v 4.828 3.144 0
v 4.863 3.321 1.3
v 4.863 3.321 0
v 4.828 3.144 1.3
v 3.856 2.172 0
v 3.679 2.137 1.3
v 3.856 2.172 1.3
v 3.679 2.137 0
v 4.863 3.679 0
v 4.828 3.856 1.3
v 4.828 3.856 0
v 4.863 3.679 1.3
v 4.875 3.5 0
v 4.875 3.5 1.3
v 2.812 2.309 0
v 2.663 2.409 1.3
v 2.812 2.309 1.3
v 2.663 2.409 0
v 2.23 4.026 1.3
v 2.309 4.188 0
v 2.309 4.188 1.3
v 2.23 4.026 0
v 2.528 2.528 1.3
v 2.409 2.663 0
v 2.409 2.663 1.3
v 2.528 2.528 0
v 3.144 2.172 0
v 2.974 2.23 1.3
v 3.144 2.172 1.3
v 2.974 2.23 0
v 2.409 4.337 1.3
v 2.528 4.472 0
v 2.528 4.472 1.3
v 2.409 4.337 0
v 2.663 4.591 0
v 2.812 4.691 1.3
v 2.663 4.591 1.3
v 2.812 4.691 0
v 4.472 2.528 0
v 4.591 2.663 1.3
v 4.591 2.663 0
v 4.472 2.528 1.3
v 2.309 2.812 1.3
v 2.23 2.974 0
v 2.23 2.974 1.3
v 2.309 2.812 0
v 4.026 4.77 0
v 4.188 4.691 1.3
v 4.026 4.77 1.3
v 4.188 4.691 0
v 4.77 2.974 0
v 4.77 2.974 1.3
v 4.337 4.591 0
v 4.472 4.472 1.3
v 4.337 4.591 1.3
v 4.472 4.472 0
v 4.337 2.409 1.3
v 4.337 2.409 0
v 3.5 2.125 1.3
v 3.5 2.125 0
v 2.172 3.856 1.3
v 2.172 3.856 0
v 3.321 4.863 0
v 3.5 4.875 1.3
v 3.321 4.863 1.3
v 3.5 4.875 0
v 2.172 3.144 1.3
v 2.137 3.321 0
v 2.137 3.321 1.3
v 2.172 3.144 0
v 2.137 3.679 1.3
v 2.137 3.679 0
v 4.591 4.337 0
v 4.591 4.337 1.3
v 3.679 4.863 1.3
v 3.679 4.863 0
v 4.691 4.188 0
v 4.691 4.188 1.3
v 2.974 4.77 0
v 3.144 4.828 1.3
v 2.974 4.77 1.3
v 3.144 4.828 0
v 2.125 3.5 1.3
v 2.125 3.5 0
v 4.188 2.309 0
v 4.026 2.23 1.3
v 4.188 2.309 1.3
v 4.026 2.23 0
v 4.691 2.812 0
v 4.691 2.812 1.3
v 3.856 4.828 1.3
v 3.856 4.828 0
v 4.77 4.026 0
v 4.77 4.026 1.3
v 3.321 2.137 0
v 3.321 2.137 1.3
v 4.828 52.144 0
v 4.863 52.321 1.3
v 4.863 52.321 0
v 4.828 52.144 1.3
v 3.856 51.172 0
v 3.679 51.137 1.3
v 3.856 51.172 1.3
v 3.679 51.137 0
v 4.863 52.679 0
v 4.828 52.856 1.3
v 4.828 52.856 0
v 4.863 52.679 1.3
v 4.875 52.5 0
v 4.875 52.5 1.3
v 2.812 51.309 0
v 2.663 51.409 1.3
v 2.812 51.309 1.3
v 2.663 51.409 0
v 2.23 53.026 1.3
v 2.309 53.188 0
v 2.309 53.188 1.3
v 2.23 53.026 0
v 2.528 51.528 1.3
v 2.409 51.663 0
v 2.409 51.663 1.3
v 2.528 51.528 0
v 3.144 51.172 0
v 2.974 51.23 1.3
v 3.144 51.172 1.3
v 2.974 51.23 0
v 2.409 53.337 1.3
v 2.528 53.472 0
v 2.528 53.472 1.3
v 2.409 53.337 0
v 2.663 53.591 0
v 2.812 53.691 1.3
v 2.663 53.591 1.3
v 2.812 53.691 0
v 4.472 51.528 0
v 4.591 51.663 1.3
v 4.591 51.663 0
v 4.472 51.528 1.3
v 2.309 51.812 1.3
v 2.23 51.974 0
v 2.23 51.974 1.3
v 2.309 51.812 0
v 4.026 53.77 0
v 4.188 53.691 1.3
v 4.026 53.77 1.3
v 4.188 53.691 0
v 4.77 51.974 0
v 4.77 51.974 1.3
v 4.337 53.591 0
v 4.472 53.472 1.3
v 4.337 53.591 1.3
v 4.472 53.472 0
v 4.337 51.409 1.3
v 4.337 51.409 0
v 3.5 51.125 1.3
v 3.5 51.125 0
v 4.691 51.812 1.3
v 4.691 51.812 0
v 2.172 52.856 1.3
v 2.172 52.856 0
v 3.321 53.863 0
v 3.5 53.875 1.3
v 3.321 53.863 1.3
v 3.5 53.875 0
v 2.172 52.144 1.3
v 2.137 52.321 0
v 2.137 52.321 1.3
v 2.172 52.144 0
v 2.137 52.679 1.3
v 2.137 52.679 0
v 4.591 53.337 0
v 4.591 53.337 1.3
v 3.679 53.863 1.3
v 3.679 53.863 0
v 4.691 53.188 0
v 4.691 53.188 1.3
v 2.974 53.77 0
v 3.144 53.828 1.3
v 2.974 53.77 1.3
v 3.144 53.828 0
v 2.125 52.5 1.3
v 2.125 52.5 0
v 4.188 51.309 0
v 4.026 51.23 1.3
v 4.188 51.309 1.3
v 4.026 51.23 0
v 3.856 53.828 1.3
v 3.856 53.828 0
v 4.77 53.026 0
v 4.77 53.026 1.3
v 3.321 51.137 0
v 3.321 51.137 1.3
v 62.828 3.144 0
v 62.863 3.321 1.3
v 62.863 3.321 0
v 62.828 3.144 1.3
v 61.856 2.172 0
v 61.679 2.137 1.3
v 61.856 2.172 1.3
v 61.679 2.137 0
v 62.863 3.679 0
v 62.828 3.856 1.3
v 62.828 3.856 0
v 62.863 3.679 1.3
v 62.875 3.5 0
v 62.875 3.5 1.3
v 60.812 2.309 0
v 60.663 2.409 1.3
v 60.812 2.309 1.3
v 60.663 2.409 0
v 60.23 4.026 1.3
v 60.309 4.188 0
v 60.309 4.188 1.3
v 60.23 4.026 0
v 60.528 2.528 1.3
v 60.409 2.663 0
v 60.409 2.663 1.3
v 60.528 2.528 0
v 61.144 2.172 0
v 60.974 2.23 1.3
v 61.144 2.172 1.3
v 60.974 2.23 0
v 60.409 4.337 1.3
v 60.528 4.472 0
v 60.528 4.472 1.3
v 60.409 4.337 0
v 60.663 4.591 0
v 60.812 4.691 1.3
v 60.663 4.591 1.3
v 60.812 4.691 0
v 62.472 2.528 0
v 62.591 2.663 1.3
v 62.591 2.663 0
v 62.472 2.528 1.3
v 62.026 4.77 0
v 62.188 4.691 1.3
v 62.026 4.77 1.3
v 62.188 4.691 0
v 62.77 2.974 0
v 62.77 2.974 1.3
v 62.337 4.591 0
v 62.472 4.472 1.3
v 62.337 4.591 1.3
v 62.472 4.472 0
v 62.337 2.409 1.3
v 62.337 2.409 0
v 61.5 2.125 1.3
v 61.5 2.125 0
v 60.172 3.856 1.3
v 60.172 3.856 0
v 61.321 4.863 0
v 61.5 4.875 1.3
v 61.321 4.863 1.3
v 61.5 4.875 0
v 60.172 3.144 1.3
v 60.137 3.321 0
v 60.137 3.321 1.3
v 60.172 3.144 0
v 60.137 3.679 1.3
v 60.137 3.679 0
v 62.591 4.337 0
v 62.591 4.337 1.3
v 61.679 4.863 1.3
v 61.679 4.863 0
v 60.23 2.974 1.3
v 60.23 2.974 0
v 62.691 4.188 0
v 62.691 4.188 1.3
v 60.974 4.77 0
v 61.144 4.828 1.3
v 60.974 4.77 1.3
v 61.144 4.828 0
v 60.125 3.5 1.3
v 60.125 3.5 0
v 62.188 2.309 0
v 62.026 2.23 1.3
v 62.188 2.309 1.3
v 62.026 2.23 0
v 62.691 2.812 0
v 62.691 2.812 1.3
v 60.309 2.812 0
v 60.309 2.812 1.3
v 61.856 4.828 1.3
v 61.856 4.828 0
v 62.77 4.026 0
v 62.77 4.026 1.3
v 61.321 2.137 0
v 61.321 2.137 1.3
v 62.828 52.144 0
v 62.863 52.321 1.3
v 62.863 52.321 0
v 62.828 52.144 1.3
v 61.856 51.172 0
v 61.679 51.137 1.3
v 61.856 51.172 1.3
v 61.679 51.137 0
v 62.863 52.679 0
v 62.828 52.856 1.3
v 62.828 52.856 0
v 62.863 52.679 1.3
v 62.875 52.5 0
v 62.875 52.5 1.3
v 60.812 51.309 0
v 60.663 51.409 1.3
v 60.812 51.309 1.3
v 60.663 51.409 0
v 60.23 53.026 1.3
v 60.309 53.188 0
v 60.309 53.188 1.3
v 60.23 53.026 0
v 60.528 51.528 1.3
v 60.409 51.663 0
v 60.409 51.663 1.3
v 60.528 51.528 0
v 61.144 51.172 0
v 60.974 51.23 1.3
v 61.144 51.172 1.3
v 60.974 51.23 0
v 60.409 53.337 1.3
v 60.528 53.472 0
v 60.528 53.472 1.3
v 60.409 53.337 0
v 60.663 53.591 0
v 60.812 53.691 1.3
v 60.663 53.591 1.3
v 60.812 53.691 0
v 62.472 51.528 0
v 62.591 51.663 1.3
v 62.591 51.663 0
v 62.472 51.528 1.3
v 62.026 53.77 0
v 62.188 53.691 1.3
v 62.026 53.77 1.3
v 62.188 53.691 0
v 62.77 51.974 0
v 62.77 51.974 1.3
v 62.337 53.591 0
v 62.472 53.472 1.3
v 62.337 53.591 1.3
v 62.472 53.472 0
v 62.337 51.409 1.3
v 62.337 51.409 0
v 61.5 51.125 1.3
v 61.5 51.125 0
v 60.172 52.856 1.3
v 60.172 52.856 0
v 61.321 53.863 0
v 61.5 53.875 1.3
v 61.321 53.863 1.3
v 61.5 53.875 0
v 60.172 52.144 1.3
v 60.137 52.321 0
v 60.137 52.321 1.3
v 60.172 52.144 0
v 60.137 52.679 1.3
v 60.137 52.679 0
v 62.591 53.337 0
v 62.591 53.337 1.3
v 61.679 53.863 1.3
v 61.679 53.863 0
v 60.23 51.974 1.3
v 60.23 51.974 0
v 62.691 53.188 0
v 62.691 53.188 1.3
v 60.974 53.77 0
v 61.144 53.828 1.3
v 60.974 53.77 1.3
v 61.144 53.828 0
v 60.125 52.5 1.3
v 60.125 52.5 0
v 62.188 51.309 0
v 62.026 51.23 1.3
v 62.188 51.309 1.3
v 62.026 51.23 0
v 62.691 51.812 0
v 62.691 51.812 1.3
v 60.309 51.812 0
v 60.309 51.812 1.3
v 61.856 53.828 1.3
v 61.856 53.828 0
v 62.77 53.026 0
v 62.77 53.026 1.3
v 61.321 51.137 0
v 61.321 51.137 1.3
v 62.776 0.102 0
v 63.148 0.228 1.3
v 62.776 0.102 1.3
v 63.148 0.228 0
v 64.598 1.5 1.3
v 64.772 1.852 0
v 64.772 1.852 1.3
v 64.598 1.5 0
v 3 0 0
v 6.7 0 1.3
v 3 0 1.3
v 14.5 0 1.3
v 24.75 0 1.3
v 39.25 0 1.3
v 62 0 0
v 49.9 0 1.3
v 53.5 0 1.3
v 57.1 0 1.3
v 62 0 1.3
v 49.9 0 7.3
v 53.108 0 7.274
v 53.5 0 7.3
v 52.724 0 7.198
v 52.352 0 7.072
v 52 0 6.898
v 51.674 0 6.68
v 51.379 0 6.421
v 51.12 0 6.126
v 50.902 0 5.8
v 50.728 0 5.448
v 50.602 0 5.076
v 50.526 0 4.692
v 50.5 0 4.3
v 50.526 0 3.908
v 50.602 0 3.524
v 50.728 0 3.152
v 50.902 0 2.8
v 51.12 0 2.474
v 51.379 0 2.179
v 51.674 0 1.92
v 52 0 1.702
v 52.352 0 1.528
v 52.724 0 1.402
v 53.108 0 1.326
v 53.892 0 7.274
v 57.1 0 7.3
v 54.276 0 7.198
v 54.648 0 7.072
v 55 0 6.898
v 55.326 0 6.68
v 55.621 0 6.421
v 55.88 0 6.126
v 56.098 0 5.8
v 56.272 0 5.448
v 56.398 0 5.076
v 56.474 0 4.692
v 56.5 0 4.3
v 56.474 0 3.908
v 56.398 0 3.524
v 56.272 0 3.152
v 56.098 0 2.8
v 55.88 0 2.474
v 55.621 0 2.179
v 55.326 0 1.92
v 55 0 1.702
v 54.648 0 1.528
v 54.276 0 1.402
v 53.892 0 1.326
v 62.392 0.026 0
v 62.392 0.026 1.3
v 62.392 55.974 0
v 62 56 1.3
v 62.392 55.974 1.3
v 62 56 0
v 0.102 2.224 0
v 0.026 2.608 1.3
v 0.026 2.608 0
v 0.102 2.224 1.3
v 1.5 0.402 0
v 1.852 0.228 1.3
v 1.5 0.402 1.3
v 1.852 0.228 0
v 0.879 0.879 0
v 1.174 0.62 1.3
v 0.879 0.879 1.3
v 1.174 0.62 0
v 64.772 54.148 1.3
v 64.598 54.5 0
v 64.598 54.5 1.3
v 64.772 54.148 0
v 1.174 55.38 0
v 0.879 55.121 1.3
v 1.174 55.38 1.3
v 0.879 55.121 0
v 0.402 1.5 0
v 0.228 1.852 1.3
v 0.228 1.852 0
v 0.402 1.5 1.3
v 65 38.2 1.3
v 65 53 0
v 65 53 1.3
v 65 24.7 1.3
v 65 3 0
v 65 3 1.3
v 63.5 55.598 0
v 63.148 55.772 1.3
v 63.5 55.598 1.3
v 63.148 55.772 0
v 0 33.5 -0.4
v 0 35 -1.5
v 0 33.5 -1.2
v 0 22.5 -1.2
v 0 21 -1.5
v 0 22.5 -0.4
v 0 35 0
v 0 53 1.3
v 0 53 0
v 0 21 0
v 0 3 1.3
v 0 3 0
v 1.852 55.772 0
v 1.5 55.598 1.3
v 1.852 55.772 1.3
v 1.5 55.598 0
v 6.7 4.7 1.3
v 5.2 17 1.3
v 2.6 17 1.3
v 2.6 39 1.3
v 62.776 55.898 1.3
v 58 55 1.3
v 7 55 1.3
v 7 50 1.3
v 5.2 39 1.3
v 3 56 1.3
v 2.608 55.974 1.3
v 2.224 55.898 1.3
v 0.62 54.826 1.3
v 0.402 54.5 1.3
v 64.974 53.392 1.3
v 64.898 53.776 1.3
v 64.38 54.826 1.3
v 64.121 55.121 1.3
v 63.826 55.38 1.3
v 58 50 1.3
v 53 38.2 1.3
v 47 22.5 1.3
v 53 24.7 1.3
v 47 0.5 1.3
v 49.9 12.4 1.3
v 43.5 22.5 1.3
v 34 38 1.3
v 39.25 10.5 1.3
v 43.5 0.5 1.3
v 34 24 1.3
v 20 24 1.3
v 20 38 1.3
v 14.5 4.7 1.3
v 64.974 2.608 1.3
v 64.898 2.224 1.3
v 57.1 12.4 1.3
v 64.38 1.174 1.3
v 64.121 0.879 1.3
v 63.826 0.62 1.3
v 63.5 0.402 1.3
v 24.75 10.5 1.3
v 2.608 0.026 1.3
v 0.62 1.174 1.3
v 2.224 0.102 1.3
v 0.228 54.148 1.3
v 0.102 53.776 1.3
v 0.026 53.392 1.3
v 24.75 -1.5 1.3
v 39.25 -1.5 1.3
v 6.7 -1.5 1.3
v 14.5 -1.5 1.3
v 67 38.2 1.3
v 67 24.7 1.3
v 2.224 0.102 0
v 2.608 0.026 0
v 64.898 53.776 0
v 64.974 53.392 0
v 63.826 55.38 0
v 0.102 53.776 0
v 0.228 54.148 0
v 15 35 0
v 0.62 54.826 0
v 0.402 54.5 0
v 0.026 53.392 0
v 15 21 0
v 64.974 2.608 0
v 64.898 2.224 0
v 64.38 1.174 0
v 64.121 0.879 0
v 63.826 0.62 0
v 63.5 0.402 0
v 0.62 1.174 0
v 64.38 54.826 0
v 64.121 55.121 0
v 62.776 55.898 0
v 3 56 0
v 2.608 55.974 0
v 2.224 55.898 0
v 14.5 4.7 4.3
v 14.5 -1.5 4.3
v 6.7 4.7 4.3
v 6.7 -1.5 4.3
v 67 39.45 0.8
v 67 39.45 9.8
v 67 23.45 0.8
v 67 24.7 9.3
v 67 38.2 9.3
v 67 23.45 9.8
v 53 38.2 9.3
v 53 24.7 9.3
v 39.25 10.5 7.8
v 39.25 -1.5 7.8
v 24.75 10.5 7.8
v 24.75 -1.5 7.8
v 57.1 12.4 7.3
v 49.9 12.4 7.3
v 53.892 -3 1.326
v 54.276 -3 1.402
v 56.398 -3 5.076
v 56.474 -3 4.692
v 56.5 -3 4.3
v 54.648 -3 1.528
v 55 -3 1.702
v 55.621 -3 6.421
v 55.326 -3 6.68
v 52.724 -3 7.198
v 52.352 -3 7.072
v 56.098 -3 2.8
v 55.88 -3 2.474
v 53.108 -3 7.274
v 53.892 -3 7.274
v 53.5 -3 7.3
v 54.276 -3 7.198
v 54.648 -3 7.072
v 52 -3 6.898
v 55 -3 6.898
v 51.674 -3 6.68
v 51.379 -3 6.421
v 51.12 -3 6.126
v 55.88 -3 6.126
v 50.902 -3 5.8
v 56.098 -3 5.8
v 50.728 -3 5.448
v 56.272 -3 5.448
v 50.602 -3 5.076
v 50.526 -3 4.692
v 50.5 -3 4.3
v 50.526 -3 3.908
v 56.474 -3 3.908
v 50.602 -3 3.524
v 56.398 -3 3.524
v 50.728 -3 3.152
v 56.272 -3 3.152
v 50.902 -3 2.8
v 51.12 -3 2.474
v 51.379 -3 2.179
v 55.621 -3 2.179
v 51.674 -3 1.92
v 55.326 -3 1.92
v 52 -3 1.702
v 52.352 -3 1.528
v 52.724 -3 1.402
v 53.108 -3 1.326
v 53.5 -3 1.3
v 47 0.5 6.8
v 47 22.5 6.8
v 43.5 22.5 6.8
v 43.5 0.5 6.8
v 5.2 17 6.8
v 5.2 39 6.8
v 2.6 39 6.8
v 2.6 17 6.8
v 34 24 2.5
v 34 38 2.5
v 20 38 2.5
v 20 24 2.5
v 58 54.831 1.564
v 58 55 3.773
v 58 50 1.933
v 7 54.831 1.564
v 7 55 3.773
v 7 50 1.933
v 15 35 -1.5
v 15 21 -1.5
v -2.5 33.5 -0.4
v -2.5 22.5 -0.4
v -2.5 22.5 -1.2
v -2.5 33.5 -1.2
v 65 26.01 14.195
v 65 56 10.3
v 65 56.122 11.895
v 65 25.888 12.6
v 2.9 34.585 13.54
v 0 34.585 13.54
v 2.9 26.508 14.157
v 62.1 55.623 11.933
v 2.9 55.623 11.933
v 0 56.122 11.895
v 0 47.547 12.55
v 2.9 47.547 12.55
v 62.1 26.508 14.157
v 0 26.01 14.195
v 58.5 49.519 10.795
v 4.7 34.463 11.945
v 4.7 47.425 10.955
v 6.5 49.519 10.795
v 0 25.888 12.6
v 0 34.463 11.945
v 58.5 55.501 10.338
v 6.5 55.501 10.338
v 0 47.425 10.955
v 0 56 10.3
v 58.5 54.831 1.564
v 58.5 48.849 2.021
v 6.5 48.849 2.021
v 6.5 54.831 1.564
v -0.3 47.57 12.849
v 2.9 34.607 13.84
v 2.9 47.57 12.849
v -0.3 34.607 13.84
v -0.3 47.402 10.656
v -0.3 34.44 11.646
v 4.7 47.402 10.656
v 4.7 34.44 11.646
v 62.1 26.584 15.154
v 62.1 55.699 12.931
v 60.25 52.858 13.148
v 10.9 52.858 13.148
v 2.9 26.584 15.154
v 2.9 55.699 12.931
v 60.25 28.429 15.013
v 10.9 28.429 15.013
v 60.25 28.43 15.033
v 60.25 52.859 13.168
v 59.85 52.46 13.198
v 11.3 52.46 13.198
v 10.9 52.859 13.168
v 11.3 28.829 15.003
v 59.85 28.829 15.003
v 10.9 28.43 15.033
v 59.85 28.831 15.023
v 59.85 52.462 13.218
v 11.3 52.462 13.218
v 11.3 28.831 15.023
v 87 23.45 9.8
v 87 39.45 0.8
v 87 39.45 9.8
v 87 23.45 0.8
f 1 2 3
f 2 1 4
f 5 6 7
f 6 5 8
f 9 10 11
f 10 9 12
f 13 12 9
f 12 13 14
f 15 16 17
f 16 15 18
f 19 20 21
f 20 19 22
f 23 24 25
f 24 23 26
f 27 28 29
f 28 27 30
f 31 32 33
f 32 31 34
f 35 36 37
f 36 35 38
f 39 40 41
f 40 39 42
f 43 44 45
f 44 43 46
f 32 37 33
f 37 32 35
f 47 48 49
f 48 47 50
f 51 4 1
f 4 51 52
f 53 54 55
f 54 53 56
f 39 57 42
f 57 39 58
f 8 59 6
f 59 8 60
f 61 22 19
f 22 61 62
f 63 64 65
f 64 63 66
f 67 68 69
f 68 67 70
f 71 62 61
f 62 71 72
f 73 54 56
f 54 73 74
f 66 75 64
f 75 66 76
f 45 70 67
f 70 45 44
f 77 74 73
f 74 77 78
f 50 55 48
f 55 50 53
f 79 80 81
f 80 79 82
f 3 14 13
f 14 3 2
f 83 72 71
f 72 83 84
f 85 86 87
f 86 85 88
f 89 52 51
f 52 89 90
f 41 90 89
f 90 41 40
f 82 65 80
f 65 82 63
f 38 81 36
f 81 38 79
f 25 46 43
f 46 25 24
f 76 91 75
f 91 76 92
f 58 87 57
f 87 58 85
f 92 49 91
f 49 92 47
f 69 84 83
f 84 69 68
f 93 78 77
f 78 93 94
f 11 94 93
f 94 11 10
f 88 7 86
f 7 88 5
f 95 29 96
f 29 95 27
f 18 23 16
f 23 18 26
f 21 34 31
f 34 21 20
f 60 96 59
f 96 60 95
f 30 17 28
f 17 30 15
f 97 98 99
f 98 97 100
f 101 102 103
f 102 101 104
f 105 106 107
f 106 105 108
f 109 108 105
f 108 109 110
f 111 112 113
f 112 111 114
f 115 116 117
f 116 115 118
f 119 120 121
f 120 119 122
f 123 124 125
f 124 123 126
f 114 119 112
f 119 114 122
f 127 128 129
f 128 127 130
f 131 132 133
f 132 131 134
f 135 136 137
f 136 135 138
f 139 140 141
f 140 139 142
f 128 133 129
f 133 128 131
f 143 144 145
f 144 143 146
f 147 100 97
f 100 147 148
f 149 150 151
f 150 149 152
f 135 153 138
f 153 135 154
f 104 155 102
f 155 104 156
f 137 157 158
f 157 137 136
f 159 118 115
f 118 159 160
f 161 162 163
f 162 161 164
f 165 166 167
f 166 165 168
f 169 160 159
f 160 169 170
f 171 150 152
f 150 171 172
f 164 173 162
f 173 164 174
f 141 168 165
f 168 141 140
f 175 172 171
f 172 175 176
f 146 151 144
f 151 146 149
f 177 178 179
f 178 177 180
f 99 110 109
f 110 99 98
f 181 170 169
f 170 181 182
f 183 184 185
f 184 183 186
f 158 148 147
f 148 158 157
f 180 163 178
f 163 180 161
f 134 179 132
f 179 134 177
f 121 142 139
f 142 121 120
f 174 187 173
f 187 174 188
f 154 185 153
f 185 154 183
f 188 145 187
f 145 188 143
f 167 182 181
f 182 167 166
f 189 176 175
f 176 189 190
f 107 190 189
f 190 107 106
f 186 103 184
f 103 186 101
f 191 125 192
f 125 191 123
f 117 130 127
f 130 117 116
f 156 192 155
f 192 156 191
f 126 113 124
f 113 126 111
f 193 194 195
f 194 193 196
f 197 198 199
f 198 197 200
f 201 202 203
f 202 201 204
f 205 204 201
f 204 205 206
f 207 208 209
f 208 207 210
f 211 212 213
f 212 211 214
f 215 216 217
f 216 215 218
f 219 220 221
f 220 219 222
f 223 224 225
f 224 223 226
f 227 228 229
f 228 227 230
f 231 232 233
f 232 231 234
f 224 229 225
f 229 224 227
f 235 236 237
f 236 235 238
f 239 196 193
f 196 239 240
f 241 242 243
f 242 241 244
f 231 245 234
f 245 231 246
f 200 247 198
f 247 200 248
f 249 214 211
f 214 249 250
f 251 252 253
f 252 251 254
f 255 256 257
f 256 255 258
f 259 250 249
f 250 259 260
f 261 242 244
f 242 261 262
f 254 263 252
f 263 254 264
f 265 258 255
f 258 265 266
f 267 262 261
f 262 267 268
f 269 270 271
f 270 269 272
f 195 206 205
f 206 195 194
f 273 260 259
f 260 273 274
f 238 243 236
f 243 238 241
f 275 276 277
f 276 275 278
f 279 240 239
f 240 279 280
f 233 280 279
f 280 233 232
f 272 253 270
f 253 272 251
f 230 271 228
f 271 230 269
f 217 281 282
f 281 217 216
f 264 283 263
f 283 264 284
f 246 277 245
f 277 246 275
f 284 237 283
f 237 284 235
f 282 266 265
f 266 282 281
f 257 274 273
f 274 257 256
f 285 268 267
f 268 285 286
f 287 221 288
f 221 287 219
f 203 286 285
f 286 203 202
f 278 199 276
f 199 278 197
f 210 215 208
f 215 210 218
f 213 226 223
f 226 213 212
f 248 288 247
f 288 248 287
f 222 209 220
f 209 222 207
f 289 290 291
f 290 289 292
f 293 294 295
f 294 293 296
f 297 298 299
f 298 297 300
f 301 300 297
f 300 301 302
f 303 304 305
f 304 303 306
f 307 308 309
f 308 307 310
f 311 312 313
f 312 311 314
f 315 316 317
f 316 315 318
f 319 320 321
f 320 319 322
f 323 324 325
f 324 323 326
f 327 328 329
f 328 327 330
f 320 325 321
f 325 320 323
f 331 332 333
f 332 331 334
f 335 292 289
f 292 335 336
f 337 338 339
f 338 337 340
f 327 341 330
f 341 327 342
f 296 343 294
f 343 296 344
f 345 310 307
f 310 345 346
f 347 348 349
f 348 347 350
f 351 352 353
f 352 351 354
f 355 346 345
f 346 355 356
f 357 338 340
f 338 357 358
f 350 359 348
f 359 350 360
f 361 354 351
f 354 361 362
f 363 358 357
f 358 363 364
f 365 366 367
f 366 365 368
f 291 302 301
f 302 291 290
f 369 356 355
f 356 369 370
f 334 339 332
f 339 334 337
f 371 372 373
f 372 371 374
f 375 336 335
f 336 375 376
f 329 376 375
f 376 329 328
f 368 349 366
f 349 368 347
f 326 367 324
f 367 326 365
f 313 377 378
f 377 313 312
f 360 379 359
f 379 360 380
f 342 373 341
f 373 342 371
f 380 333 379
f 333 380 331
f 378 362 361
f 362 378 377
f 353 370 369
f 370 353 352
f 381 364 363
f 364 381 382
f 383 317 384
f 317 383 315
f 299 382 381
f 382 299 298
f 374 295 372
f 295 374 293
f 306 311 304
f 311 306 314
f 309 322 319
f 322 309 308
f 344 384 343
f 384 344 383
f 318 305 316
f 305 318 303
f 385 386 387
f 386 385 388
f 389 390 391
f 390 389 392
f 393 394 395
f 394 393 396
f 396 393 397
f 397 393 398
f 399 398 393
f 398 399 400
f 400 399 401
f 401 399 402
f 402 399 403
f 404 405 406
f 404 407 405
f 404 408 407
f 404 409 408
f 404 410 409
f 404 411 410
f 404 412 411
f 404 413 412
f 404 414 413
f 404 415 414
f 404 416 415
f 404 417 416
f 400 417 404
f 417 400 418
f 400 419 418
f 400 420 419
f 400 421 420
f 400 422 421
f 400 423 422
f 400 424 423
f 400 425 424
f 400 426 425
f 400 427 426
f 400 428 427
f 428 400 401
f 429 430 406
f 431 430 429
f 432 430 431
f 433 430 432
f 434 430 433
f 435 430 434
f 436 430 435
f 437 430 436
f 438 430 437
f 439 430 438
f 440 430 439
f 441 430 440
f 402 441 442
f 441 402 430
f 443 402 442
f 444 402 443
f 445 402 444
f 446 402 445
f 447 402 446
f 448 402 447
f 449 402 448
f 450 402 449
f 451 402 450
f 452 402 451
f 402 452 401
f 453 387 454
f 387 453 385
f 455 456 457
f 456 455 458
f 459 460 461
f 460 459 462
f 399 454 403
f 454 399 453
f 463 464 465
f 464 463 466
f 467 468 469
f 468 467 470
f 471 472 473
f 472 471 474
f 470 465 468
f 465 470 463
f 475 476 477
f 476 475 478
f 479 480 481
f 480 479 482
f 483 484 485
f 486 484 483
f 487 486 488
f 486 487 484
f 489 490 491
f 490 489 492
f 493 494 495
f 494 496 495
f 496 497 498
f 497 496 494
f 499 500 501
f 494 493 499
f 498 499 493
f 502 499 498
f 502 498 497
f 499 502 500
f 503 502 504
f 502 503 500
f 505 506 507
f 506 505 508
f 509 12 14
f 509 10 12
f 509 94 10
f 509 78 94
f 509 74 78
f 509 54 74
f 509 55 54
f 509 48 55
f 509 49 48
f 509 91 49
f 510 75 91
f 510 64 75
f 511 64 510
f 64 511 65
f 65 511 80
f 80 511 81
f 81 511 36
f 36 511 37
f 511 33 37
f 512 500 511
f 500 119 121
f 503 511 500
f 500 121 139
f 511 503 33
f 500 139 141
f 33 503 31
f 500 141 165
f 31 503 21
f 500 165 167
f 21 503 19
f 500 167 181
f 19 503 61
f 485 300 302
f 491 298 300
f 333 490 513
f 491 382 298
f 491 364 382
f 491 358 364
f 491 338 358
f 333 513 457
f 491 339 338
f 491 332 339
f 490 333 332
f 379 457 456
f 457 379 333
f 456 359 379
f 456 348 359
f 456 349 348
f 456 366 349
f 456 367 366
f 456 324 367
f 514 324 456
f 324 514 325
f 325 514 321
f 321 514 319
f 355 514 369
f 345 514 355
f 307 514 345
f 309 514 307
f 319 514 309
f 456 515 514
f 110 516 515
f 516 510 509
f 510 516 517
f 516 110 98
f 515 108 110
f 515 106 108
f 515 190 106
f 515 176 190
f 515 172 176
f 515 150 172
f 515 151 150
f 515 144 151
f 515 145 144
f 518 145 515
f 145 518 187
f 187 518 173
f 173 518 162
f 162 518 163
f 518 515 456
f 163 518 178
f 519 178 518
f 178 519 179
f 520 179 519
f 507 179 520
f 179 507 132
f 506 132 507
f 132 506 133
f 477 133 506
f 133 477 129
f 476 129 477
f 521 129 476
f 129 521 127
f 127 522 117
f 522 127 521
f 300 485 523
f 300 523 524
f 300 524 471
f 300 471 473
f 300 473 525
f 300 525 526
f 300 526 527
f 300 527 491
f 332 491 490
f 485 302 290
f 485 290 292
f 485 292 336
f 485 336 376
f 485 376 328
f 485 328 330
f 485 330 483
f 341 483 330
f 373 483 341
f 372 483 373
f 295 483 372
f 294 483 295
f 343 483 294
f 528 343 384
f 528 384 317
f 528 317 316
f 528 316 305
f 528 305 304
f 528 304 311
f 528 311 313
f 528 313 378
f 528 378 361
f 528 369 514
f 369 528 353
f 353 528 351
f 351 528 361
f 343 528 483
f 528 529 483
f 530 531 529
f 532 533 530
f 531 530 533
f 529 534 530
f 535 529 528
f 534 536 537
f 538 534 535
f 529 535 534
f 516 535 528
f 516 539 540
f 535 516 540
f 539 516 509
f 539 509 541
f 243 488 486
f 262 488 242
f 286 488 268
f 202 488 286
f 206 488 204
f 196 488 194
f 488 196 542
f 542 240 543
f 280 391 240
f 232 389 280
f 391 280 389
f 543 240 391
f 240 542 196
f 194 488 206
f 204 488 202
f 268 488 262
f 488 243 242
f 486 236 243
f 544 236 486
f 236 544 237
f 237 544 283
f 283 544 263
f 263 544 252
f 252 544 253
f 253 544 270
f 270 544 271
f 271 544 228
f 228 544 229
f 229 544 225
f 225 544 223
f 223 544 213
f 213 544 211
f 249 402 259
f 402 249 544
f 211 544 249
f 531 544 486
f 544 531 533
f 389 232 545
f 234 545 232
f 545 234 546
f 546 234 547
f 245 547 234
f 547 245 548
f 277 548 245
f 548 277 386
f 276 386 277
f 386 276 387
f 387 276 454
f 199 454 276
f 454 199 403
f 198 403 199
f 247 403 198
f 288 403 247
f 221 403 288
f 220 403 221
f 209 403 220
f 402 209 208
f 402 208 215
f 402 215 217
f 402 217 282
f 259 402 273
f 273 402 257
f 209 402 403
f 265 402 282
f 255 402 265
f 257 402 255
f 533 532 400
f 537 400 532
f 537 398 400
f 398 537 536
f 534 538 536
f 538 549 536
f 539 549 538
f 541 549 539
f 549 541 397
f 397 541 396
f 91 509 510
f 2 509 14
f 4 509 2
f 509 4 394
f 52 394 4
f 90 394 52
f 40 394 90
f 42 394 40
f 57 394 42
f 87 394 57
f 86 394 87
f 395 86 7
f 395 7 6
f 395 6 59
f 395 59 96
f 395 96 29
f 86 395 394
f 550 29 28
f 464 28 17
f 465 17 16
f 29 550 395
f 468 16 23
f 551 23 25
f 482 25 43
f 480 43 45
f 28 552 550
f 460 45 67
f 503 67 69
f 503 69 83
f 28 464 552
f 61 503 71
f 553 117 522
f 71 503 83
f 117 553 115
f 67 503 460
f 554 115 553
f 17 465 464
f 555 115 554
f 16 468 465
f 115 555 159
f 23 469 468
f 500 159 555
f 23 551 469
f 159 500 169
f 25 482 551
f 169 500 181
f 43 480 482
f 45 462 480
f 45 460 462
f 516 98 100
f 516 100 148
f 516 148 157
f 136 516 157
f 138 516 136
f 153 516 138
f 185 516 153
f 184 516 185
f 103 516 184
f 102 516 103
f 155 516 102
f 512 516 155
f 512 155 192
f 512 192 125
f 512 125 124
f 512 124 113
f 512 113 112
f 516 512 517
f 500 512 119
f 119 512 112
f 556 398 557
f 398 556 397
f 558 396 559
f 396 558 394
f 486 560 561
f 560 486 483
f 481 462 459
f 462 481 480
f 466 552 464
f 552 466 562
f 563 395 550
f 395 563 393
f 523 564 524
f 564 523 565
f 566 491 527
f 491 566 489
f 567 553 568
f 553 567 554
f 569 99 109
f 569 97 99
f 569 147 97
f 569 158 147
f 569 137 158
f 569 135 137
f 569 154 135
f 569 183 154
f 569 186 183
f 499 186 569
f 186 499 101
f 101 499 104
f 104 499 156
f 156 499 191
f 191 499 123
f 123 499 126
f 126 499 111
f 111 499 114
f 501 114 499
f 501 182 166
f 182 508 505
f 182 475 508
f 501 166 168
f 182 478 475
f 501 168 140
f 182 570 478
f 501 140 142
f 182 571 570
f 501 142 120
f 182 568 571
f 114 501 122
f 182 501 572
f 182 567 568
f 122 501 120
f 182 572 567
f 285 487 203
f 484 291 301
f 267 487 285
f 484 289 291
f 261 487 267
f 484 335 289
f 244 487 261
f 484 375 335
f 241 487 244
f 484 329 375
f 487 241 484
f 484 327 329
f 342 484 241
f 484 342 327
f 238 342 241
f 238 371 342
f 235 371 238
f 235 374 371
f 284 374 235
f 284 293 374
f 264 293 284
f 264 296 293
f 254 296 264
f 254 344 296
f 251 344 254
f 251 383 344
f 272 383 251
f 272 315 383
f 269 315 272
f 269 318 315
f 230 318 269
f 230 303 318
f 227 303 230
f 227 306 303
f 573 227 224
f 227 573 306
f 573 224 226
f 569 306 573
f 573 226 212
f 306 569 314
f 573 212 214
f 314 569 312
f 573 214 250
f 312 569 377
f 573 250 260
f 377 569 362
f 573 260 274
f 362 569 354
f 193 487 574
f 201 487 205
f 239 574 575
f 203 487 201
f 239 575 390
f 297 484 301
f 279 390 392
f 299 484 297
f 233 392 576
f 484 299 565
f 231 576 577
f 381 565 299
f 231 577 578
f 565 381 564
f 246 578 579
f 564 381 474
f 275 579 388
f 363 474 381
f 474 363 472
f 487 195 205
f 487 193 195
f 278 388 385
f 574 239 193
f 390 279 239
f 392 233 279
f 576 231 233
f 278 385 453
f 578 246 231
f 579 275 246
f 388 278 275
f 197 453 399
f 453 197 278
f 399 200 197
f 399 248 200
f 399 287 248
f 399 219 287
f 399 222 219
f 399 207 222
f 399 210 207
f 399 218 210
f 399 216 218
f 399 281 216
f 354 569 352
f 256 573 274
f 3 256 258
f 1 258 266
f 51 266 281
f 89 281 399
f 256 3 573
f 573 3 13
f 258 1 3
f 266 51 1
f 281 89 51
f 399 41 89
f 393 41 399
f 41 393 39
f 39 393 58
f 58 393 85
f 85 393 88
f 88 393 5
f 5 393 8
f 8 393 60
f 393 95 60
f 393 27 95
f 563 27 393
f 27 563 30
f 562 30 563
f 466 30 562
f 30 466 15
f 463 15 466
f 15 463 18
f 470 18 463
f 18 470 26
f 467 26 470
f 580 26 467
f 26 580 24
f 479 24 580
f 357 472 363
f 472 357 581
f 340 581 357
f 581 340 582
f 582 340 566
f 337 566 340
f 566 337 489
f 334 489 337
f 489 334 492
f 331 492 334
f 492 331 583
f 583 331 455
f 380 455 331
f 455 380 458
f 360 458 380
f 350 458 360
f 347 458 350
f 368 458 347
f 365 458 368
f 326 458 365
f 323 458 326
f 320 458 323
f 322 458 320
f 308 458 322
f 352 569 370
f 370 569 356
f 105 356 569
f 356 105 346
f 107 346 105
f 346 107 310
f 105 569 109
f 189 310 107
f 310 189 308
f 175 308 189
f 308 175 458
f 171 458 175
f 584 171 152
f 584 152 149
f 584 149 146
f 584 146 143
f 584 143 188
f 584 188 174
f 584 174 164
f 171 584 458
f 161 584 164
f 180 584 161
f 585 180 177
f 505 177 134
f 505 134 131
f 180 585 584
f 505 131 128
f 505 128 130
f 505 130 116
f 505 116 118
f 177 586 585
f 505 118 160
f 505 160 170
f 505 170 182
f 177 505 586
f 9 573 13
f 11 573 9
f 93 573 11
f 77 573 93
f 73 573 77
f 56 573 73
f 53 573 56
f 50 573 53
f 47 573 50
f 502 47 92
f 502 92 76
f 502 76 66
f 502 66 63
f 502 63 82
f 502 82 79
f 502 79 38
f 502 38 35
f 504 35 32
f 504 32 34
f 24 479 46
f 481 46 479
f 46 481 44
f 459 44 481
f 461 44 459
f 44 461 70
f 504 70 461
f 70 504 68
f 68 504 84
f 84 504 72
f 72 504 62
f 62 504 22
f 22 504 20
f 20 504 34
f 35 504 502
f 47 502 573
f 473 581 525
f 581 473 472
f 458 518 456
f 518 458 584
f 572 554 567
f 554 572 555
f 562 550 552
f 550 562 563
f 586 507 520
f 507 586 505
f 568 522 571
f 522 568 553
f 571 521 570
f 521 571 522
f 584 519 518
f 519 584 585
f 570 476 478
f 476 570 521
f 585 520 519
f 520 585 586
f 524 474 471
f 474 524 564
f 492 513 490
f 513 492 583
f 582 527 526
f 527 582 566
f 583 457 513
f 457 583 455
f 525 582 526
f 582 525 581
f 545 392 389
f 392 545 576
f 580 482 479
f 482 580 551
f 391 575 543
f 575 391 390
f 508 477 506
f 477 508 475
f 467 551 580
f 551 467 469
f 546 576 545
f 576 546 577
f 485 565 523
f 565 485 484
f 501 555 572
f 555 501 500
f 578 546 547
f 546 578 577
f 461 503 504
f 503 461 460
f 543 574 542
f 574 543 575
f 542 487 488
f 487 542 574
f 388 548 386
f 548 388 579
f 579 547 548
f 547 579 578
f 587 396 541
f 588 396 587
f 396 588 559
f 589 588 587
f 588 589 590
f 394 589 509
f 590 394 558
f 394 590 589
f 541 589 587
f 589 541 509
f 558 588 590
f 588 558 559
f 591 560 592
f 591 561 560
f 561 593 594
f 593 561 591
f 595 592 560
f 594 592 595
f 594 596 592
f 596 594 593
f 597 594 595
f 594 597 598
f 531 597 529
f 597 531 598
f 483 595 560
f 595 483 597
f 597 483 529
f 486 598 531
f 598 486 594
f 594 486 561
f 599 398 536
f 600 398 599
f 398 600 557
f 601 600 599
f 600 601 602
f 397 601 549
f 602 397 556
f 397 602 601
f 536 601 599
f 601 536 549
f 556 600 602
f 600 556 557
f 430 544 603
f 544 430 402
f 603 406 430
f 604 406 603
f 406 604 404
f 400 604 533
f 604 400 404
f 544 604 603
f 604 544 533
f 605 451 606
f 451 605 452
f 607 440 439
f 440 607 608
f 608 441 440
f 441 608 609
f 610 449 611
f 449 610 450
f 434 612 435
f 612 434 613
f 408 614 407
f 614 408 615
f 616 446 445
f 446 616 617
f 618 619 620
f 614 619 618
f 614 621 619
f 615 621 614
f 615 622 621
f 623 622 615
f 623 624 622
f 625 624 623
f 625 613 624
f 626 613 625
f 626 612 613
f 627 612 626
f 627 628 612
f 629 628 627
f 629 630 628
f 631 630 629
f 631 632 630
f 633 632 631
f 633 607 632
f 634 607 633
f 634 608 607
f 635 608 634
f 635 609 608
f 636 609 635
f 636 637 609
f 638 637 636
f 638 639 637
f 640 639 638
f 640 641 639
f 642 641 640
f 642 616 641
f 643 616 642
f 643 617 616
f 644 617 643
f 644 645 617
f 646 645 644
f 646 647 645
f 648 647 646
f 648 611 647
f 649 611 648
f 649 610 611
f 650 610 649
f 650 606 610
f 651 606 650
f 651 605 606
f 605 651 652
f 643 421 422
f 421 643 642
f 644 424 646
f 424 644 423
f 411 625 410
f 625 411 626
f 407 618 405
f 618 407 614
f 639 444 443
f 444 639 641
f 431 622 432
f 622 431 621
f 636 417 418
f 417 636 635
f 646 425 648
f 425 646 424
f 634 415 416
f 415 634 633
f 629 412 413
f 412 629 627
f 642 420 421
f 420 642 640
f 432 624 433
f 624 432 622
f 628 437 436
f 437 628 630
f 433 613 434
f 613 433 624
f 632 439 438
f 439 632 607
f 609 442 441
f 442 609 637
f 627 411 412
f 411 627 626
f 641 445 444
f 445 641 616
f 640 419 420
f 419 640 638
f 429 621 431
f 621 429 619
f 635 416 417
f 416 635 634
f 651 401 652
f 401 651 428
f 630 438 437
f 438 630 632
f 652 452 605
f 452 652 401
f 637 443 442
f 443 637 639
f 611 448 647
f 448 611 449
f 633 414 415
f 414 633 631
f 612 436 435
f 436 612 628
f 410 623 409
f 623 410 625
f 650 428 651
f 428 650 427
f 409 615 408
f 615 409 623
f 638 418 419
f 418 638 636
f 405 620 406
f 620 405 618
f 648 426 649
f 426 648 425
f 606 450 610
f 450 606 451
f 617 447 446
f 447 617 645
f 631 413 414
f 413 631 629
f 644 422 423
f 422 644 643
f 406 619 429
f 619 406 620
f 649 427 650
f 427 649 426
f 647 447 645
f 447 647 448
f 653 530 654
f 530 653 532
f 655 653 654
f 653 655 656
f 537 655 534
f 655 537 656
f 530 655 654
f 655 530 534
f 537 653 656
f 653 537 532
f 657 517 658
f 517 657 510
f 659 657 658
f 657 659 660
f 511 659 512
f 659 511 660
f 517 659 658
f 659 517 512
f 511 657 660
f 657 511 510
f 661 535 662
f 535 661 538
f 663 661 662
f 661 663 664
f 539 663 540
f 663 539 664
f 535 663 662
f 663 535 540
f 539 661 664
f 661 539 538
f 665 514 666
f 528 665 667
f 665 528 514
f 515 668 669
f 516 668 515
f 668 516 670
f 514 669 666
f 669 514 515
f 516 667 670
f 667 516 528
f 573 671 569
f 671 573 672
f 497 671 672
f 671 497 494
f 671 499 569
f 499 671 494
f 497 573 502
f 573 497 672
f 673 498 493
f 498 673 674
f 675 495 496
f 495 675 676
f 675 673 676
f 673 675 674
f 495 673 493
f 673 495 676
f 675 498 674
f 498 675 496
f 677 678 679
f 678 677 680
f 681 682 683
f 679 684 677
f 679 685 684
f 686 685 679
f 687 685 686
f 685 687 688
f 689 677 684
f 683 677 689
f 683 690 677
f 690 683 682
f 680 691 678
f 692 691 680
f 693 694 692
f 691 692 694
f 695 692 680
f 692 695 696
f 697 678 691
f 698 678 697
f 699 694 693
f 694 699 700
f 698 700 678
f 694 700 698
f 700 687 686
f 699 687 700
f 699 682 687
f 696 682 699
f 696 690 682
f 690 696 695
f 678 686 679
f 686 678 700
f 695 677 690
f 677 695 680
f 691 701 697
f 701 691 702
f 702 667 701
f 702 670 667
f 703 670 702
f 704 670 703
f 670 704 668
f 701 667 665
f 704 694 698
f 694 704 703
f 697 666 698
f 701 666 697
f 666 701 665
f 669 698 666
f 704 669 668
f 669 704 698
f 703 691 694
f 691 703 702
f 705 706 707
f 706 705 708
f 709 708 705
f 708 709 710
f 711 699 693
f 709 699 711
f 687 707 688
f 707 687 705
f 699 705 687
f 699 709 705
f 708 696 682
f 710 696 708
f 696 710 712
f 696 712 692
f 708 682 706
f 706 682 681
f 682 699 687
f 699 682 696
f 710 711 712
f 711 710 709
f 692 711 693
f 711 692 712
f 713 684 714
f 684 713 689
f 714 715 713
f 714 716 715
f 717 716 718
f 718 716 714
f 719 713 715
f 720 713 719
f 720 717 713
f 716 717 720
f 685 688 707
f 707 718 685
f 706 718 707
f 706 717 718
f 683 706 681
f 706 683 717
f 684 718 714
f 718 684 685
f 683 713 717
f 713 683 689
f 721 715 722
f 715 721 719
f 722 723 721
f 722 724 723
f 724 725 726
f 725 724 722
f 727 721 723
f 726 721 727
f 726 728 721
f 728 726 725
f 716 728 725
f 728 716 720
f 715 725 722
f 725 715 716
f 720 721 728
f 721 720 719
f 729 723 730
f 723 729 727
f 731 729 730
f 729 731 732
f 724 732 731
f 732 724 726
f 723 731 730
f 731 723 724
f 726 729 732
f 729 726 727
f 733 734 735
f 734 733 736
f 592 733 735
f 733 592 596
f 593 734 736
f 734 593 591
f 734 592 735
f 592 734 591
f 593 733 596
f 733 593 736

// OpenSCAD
// HAUKI hardware model: Raspberry Pi 1A+, Waveshare 2.13" e-Paper HAT V4 and panel.
// Not printable. It is the reference the case is designed around.
//
// Frame: wall-mounted orientation seen from the front. Origin at the Pi's lower left
// corner, on the underside of the board. +X right, +Y up, +Z out of the wall.
//
// Sources: [D] Pi A+ mechanical drawing, [S] V4 panel specification p.6, [M] measured on
// the real parts, [A] assumed, correct from test prints.

/* [Pi] */
pi_w = 65;              // [D]
pi_h = 56;              // [D]
pi_t = 1.3;             // [M]
pi_corner_r = 3;        // [D]
pi_hole_d = 2.75;       // [D]
pi_hole_inset = 3.5;    // [D]

header_cx = pi_w / 2;   // [D] 29 mm from the left hole
header_cy = pi_h - pi_hole_inset;
header_l = 51;          // [D] scaled
header_w = 5;           // [D] scaled
header_z = 8.5;         // [D] above the board

/* [Ports] */
usb_power_cx = 10.6;    // [D]
usb_power_top = 4.3;    // [M] from the underside of the board
usb_a_cy = 31.45;       // [D]
usb_a_top = 9.3;        // [M] from the underside; the drawing implies 8.4
hdmi_cx = 32;           // [D]
hdmi_z = 6.5;           // [D] above the board
audio_cx = pi_w - 11.5; // [D]
audio_z = 6;            // [D] above the board

/* [HAT] */
hat_w = 65;             // published
hat_h = 30.2;           // published
hat_t = 1.6;            // [A]
hat_gap_top = 9;        // [M] HAT underside to Pi top surface, at the header end
hat_gap_bottom = 11.3;  // [M] same, at the free end; the tilt is intentional
hat_inset_x = 0;        // [A] flush with the Pi's left edge
hat_inset_top = 0;      // [A] flush with the Pi's top edge
socket_h = 8.8;         // [A] the plastic socket that rests on the Pi

/* [Panel] */
glass_w = 59.2;         // [S]
glass_h = 29.2;         // [S]
glass_t = 1;            // [S]
glass_gap = 0;          // [A] between HAT and glass
glass_inset_x = (hat_w - glass_w) / 2;  // [M] about 3 mm on both sides
glass_inset_y = (hat_h - glass_h) / 2;  // [M] about at the HAT's edges
// Distances from the glass edges; the ribbon end is on the left
aa_w = 48.55;           // [S] active area, the pixels
aa_h = 23.70;           // [S]
aa_inset_ribbon = 8.4;  // [S]
aa_inset_top = 3.25;    // [S] which long edge this belongs to is inferred
va_margin = 0.4;        // [S] viewing area beyond the active area on each side
ribbon_w = 13;          // [A]

/* [Dongle] */
// Placeholder, the fit is worked out from test prints
dongle_l = 20;
dongle_w = 16;
dongle_t = 9;

$fn = 48;
eps = 0.02;

hat_angle = asin((hat_gap_bottom - hat_gap_top) / hat_h);

// Moves a part from the HAT's frame into the Pi's. In the HAT's frame the origin is the
// upper left corner of its underside, and the board runs towards -Y.
module on_hat() {
    translate([hat_inset_x, pi_h - hat_inset_top, pi_t + hat_gap_top])
        rotate([-hat_angle, 0, 0])
            children();
}

function hat_z(y) = pi_t + hat_gap_top + (pi_h - hat_inset_top - y) * tan(hat_angle);

module rounded_plate(w, h, t, r) {
    linear_extrude(t)
        translate([r, r])
            offset(r)
                square([w - 2 * r, h - 2 * r]);
}

module pi_board() {
    color("seagreen")
        difference() {
            rounded_plate(pi_w, pi_h, pi_t, pi_corner_r);
            for (x = [pi_hole_inset, pi_w - pi_hole_inset], y = [pi_hole_inset, pi_h - pi_hole_inset])
                translate([x, y, -1])
                    cylinder(d = pi_hole_d, h = pi_t + 2);
        }
}

// The sizes of the ports and chips are scaled from the drawing, their overhangs included
module pi_parts() {
    color("gold")
        translate([header_cx - header_l / 2, header_cy - header_w / 2, pi_t])
            cube([header_l, header_w, header_z]);

    color("silver") {
        translate([usb_power_cx - 3.9, -1.5, pi_t])
            cube([7.8, 6.2, usb_power_top - pi_t]);
        translate([pi_w - 12, usb_a_cy - 6.75, pi_t])
            cube([14, 13.5, usb_a_top - pi_t]);
        translate([hdmi_cx - 7.25, -1.5, pi_t])
            cube([14.5, 12, hdmi_z]);
    }

    color("dimgray") {
        translate([audio_cx - 3.6, 0, pi_t])
            cube([7.2, 12.4, audio_z]);
        translate([audio_cx, 0, pi_t + 3])
            rotate([90, 0, 0])
                cylinder(d = 6, h = 3);
        // Camera and display connectors
        translate([43.5, 0.5, pi_t])
            cube([3.5, 22, 5.5]);
        translate([2.6, 17, pi_t])
            cube([2.6, 22, 5.5]);
        // SoC
        translate([20, 24, pi_t])
            cube([14, 14, 1.2]);
    }

    // microSD on the underside of the left edge, not in the drawing
    color("dimgray")
        translate([0, 28 - 7, -1.5])
            cube([15, 14, 1.5]);
    color("royalblue")
        translate([-2.5, 28 - 5.5, -1.2])
            cube([15, 11, 0.8]);
}

module dongle() {
    color("white")
        translate([pi_w + 2, usb_a_cy - dongle_w / 2, (pi_t + usb_a_top) / 2 - dongle_t / 2])
            cube([dongle_l, dongle_w, dongle_t]);
}

module hat() {
    color("steelblue")
        translate([0, -hat_h, 0])
            cube([hat_w, hat_h, hat_t]);
    // The socket reaches down onto the Pi
    color("black")
        translate([header_cx - hat_inset_x - (header_l + 1) / 2, -(pi_h - hat_inset_top - header_cy) - (header_w + 1) / 2, -socket_h])
            cube([header_l + 1, header_w + 1, socket_h]);
}

module panel() {
    z0 = hat_t + glass_gap;
    x0 = glass_inset_x;
    y0 = -hat_h + glass_inset_y;
    aa_x = x0 + aa_inset_ribbon;
    aa_y = y0 + glass_h - aa_inset_top - aa_h;

    color("whitesmoke")
        translate([x0, y0, z0])
            cube([glass_w, glass_h, glass_t]);
    color("lightgray")
        translate([aa_x - va_margin, aa_y - va_margin, z0 + glass_t])
            cube([aa_w + 2 * va_margin, aa_h + 2 * va_margin, eps]);
    color("gainsboro")
        translate([aa_x, aa_y, z0 + glass_t + eps])
            cube([aa_w, aa_h, eps]);
    // The ribbon wraps around the HAT's left edge to its underside
    color("darkorange")
        translate([-0.3, y0 + (glass_h - ribbon_w) / 2, 0]) {
            translate([0, 0, hat_t])
                cube([x0 + 0.3, ribbon_w, 0.3]);
            translate([0, 0, -0.3])
                cube([0.3, ribbon_w, hat_t + 0.6]);
            translate([0, 0, -0.3])
                cube([5, ribbon_w, 0.3]);
        }
}

module hardware() {
    pi_board();
    pi_parts();
    dongle();
    on_hat() {
        hat();
        panel();
    }
}

// case.scad includes this file and sets this to false
show_hardware = true;

if (show_hardware)
    hardware();

echo(hat_angle = hat_angle);
echo(usb_a_clearance_to_hat = hat_z(usb_a_cy + 6.75) - usb_a_top);
echo(header_clearance_to_hat = hat_z(header_cy + header_w / 2) - (pi_t + header_z));
echo(panel_front_at_top = hat_z(pi_h - hat_inset_top) + (hat_t + glass_gap + glass_t) / cos(hat_angle));
echo(panel_front_at_bottom = hat_z(pi_h - hat_inset_top - hat_h * cos(hat_angle)) + (hat_t + glass_gap + glass_t) / cos(hat_angle));
